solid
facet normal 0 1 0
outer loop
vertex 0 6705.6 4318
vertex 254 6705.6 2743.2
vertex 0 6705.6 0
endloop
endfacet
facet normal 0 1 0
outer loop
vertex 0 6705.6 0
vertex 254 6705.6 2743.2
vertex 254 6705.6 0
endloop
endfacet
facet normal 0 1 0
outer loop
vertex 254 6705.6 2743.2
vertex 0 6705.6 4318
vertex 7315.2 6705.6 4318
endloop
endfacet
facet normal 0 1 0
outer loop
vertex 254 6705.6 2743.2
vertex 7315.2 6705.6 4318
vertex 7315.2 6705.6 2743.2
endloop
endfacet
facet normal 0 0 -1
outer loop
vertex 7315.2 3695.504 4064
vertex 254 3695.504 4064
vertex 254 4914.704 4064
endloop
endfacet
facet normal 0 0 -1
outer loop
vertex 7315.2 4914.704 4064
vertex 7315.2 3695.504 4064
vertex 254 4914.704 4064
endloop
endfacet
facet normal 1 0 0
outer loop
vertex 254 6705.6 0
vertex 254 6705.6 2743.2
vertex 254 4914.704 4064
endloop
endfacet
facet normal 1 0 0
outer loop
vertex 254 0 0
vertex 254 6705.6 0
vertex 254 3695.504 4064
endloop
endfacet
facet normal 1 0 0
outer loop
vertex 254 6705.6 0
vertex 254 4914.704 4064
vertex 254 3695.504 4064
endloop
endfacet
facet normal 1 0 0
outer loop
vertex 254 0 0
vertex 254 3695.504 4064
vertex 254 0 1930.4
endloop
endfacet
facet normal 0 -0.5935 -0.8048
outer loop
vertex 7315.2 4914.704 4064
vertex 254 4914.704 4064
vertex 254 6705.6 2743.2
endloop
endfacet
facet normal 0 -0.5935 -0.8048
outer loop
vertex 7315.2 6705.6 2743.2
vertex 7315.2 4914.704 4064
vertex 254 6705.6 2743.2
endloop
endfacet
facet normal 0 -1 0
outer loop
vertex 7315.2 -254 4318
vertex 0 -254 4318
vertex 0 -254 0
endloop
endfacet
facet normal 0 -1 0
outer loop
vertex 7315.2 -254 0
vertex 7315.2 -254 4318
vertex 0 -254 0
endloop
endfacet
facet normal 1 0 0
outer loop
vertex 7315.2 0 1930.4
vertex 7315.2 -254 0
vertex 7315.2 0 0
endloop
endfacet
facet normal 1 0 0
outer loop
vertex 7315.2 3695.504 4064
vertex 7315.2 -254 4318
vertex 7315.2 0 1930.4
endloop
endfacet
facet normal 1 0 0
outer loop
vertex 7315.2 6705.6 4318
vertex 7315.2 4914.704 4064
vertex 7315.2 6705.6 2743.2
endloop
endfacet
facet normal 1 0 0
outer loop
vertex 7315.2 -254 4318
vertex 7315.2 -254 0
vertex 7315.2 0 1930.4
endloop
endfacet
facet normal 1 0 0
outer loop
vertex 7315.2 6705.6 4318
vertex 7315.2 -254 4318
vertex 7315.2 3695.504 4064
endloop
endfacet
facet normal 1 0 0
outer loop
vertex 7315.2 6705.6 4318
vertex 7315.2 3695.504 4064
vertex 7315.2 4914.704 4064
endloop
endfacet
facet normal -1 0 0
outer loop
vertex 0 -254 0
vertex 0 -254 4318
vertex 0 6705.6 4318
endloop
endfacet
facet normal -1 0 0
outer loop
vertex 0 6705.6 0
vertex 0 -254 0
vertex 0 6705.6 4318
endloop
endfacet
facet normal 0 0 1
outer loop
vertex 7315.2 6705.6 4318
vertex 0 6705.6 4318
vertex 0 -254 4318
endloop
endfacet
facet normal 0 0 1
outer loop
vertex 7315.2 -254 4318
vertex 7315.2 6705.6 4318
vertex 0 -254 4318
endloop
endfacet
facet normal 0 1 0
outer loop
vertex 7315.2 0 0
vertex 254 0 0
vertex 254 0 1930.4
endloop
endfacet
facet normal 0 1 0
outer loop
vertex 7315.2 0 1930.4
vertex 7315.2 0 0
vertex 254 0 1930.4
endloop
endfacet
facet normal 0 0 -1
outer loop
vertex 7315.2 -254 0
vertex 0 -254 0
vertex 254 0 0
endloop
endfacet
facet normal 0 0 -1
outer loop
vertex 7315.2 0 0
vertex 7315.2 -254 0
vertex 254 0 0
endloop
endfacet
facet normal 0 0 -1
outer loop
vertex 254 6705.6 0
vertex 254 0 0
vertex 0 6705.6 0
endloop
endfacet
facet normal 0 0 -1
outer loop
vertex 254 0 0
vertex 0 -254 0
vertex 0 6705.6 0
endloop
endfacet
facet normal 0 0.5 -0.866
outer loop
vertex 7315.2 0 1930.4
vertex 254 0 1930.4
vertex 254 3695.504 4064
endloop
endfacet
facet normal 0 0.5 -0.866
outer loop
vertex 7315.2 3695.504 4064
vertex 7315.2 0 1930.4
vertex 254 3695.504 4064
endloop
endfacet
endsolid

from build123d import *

# Parameters (mm, degrees)
F1_DEPTH = 7315.2
F3_DEPTH = 254
F5_DEPTH = 7315.201


with BuildPart() as f1:
    # F0 (on Right) → F1 (new body)
    with BuildSketch(Plane.YZ):
        Polygon((-254, 0), (0, 0), (0, 1930.4), (3695.503603, 4064), (4914.703603, 4064), (6705.6, 2743.2), (6705.6, 0), (6959.6, 0), (6959.6, 4318), (-254, 4318), align=None)
    extrude(amount=F1_DEPTH)

    # F2 (on face) → F3 (join)
    with BuildSketch(Plane(origin=(0, 0, 0), x_dir=(0, -1, 0), z_dir=(-1, 0, 0))):
        Polygon((254, 0), (254, 4318), (-6959.6, 4318), (-6959.6, 0), (0, 0), align=None)
    extrude(amount=-F3_DEPTH)

    # F4 (on face) → F5 (cut, through all)
    with BuildSketch(Plane.YZ.offset(7315.2)):
        Polygon((6705.6, 2743.2), (6705.6, 0), (6959.6, 0), (6959.6, 4318), (6705.6, 4318), align=None)
    extrude(amount=-F5_DEPTH, mode=Mode.SUBTRACT)


solid = f1.part
